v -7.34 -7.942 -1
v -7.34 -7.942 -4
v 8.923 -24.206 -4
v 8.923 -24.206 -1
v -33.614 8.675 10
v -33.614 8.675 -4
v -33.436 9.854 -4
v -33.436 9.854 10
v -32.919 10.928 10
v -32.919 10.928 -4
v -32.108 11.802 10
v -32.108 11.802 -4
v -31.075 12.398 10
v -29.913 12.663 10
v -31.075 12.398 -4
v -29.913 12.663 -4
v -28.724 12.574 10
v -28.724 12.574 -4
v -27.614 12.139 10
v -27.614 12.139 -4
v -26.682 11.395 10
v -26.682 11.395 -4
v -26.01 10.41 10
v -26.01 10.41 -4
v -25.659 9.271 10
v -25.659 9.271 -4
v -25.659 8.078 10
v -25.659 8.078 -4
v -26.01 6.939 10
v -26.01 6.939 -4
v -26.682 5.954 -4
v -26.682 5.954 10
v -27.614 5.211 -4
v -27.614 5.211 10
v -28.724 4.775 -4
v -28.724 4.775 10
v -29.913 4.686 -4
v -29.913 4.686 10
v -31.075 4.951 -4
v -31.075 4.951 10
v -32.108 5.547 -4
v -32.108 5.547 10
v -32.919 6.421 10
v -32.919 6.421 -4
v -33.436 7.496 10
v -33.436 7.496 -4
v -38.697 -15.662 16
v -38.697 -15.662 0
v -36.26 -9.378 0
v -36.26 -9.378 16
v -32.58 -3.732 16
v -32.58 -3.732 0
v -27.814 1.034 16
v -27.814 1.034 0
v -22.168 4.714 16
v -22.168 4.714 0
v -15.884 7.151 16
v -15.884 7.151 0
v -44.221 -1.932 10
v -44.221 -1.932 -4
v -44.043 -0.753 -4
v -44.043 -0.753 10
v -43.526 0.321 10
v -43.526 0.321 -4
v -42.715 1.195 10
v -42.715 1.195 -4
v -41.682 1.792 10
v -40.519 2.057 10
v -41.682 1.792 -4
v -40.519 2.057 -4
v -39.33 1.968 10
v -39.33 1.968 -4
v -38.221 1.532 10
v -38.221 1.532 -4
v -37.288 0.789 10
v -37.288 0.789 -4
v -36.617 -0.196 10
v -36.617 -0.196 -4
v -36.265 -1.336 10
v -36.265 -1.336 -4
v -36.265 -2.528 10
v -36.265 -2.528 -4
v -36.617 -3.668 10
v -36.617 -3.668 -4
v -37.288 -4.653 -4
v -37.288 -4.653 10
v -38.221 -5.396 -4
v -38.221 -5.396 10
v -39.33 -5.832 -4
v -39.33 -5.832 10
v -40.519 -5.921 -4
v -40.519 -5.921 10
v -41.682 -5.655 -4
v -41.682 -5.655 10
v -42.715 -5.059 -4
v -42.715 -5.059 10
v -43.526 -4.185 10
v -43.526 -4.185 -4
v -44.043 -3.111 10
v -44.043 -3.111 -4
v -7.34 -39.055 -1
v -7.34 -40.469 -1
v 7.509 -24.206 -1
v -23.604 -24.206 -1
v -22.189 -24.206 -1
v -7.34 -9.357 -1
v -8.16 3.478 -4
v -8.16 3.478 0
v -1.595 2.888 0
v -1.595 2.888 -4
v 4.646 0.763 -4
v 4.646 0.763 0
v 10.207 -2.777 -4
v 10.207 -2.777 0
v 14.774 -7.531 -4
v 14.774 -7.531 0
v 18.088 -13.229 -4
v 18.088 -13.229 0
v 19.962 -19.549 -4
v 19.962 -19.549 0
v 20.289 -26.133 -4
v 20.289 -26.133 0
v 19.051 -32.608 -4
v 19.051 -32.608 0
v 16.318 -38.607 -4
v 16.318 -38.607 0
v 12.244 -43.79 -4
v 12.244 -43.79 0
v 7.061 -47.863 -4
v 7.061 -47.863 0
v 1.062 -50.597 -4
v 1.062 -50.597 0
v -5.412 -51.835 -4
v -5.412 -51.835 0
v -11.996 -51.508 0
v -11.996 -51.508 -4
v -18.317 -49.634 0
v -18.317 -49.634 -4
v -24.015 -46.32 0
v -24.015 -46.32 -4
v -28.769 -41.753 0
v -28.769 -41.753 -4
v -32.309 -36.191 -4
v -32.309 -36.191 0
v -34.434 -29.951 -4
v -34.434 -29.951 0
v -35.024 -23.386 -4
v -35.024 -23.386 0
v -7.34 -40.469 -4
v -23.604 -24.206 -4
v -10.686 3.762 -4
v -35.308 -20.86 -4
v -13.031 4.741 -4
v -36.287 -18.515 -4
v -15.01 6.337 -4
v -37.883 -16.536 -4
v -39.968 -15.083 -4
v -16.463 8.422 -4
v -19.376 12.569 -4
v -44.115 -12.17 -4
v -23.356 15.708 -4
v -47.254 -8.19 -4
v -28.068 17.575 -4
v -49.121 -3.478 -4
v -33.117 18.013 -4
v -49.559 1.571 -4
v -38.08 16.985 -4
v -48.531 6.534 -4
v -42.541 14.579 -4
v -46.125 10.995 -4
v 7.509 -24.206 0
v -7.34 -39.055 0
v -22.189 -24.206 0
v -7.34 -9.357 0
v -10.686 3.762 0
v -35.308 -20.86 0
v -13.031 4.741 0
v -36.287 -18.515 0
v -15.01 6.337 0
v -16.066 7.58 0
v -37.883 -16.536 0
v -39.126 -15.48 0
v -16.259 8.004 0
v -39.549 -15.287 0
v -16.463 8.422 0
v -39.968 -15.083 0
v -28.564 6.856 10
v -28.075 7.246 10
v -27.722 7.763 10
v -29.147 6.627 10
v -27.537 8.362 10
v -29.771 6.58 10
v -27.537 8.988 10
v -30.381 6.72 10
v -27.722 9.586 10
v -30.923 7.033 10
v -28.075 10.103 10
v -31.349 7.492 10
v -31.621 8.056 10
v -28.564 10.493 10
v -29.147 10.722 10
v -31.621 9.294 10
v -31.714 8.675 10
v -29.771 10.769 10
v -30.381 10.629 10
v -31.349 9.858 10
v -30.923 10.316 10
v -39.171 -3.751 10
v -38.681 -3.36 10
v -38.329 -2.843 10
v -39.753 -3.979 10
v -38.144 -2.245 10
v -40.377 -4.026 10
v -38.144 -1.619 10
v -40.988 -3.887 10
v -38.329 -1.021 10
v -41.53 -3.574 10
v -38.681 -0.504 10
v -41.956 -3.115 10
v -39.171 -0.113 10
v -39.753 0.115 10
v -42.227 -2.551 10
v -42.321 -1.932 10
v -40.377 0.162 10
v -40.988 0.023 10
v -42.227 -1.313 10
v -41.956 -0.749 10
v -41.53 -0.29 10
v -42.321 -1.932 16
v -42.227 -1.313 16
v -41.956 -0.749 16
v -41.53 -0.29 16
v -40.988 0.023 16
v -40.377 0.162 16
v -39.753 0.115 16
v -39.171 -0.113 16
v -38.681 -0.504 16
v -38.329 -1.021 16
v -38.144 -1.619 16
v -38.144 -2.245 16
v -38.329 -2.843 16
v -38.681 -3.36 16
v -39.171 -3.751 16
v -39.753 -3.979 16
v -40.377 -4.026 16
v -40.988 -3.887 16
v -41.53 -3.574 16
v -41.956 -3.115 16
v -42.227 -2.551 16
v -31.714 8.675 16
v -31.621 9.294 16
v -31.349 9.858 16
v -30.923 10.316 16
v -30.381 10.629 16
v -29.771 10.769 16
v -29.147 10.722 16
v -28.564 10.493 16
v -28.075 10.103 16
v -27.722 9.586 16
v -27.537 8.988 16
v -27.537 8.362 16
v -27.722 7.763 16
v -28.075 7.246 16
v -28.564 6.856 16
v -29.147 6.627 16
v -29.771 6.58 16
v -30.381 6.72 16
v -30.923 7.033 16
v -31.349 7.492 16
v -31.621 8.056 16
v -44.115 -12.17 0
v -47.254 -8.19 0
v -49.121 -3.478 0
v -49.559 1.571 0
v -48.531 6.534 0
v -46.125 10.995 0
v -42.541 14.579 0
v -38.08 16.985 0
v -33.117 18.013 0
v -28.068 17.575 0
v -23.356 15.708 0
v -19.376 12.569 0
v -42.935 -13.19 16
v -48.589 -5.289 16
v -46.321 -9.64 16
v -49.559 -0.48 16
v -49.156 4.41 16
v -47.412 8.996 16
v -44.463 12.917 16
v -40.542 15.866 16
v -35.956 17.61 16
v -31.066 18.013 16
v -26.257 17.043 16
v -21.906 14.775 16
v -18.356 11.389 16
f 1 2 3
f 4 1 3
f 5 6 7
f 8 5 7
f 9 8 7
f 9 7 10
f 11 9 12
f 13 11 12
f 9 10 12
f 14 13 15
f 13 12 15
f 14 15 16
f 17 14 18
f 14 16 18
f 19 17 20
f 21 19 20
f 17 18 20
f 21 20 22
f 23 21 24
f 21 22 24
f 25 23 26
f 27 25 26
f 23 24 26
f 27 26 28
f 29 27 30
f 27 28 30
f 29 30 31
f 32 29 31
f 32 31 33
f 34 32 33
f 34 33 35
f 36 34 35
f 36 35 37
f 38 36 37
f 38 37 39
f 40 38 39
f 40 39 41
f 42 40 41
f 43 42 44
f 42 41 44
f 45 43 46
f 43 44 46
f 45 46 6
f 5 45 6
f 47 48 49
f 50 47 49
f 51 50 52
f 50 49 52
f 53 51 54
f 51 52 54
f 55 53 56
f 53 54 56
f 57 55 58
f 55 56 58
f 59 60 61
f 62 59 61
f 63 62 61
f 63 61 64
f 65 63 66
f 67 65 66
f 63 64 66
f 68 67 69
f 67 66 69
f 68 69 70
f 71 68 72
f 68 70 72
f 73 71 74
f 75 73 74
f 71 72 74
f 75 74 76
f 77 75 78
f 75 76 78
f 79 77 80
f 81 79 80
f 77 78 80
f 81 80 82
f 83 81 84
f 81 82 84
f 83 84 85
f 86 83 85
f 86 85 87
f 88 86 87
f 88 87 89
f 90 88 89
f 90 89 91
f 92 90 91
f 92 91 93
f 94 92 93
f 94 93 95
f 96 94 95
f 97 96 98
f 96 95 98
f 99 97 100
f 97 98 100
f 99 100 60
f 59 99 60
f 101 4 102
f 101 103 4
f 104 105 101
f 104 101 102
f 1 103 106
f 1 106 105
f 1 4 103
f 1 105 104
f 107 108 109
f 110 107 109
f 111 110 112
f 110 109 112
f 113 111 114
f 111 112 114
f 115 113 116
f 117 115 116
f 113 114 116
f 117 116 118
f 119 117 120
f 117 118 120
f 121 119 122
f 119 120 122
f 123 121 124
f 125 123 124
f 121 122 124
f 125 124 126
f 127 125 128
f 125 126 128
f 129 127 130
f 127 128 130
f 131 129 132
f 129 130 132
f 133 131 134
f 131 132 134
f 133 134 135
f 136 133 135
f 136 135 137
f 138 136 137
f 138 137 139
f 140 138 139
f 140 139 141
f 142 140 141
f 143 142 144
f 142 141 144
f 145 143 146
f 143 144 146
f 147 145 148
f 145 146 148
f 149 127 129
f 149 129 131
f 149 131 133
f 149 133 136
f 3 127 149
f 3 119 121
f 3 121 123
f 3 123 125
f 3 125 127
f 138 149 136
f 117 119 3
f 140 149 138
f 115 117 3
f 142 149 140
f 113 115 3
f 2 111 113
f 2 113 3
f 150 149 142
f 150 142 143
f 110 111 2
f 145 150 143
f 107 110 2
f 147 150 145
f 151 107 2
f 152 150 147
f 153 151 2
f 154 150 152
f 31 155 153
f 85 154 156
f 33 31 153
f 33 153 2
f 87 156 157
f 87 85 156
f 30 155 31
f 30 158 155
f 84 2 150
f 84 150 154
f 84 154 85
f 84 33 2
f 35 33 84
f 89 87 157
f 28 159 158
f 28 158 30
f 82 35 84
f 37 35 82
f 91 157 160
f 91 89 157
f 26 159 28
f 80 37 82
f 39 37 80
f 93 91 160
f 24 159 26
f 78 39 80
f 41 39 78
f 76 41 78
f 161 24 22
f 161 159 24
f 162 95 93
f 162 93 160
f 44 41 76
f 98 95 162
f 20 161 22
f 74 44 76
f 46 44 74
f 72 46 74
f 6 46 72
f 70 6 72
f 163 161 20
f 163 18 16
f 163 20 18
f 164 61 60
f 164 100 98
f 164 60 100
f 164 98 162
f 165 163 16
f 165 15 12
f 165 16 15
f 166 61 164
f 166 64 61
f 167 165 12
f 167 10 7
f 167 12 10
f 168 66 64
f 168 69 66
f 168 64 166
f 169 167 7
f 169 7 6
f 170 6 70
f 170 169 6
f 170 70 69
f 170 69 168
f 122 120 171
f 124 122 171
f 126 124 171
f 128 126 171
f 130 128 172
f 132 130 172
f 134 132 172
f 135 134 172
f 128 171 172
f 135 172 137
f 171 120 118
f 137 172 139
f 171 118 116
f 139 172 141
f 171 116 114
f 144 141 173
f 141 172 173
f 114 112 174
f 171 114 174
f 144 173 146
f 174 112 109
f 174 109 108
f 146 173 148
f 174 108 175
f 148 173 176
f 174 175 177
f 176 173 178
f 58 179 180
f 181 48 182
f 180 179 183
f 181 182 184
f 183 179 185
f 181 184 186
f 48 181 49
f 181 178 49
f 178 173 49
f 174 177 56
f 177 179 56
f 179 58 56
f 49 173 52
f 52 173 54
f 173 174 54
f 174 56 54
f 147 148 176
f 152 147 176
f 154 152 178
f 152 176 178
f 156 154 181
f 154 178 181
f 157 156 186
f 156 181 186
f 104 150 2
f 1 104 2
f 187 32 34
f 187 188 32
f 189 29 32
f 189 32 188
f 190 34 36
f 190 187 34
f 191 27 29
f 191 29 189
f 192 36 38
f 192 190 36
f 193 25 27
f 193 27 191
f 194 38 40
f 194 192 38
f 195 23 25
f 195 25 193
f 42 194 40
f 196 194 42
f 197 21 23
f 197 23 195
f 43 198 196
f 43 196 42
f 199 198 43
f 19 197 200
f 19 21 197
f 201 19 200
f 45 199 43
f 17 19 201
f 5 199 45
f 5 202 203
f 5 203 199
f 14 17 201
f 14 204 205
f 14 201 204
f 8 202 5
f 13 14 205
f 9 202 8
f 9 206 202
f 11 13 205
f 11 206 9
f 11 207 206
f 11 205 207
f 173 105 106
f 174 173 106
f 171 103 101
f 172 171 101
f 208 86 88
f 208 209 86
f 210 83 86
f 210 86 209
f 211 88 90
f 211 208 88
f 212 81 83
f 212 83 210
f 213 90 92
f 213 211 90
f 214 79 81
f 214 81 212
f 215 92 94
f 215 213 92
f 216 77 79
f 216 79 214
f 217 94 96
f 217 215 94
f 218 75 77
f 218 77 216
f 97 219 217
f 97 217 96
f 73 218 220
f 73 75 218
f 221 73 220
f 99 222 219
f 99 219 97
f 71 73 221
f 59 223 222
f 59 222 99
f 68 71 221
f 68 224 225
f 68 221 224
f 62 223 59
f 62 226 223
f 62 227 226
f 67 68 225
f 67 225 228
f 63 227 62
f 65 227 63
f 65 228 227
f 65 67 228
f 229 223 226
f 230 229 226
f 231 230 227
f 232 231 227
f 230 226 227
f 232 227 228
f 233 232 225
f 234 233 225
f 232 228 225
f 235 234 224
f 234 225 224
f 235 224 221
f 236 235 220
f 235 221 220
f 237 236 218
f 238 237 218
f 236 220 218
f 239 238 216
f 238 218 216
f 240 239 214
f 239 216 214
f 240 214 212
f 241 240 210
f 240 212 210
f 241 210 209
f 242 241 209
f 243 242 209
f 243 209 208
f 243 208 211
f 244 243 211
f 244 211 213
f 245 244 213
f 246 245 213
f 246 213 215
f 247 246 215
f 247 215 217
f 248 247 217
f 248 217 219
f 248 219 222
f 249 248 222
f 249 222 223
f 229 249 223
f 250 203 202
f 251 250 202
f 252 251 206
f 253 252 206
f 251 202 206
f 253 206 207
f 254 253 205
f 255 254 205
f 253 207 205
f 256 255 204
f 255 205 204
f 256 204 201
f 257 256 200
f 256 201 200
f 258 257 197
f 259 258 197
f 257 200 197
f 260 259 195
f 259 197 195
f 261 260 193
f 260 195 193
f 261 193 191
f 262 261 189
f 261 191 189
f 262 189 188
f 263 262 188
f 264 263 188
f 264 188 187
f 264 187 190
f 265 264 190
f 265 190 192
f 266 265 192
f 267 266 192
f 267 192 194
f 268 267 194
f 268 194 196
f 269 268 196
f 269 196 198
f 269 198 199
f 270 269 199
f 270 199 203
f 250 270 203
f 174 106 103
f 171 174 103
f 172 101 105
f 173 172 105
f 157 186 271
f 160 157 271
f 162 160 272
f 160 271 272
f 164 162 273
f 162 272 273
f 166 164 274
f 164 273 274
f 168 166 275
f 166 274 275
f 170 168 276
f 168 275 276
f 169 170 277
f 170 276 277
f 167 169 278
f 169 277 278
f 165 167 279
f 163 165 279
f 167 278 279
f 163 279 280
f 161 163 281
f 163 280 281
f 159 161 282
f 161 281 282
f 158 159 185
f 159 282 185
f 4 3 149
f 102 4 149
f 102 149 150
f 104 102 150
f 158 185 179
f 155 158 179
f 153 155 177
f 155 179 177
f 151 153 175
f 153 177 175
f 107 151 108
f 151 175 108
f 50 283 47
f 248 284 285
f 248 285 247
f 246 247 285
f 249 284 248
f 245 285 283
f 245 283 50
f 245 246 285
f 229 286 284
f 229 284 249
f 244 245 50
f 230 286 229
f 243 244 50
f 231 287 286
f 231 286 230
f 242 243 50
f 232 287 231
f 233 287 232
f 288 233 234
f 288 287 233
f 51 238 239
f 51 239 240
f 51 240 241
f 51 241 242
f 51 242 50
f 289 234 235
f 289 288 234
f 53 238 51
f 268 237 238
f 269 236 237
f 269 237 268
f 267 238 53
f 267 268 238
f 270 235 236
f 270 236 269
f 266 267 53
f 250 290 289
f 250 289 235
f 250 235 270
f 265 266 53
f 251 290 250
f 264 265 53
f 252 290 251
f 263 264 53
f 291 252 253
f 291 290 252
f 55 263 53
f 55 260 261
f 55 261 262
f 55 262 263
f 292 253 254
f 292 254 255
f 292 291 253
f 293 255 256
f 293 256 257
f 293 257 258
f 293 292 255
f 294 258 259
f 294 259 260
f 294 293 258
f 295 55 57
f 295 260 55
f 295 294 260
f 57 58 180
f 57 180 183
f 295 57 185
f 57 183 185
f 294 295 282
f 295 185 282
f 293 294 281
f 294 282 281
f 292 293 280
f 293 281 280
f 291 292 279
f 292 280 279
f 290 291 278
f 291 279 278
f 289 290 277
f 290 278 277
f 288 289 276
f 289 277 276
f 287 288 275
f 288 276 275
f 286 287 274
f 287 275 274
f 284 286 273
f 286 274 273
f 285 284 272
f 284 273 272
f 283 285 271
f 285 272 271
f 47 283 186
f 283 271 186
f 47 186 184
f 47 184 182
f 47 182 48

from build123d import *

# Parameters (mm, degrees)
BOSS_EXTRUDE1_DEPTH = 16
BOSS_EXTRUDE2_DEPTH = 4
SKETCH3_R           = 2.1
CUT_EXTRUDE1_DEPTH  = 21
SKETCH4_R           = 4
CUT_EXTRUDE2_DEPTH  = 14
CUT_EXTRUDE3_DEPTH  = 3
CUT_EXTRUDE4_DEPTH  = 18


with BuildPart() as part:
    # Sketch1 → Boss-Extrude1 (new body)
    with BuildSketch(Plane.XY):
        with BuildLine():
            ThreePointArc((-15.884378154, 7.150884492), (-44.46319957, 12.91724959), (-38.696834472, -15.661571826))
            ThreePointArc((-38.696834472, -15.661571826), (-30.321063947, -1.224886034), (-15.884378154, 7.150884492))
        make_face()
    extrude(amount=BOSS_EXTRUDE1_DEPTH)

    # Sketch2 → Boss-Extrude2 (add)
    with BuildSketch(Plane(origin=(0, 0, 0), x_dir=(-1, 0, 0), z_dir=(0, 0, -1))):
        with BuildLine():
            ThreePointArc((8.160247818, 3.478149899), (-12.244043633, -43.789993613), (35.024099879, -23.385702162))
            ThreePointArc((35.024099879, -23.385702162), (36.287266145, -18.514575936), (39.968005835, -15.08301433))
            ThreePointArc((39.968005835, -15.08301433), (44.46319957, 12.91724959), (16.46293565, 8.422055855))
            ThreePointArc((16.46293565, 8.422055855), (13.031374044, 4.741316164), (8.160247818, 3.478149899))
        make_face()
    extrude(amount=BOSS_EXTRUDE2_DEPTH)

    # Sketch3 → Cut-Extrude1 (cut, through all)
    with BuildSketch(Plane(origin=(0, 0, -4), x_dir=(-1, 0, 0), z_dir=(0, 0, -1))):
        with Locations((40.220558883, -1.931992815)):
            Circle(SKETCH3_R)
        with Locations((29.613957165, 8.674608903)):
            Circle(SKETCH3_R)
    extrude(amount=-CUT_EXTRUDE1_DEPTH, mode=Mode.SUBTRACT)

    # Sketch4 → Cut-Extrude2 (cut)
    with BuildSketch(Plane(origin=(0, 0, -4), x_dir=(-1, 0, 0), z_dir=(0, 0, -1))):
        with Locations((40.220558883, -1.931992815)):
            Circle(SKETCH4_R)
        with Locations((29.613957165, 8.674608903)):
            Circle(SKETCH4_R)
    extrude(amount=-CUT_EXTRUDE2_DEPTH, mode=Mode.SUBTRACT)

    # Sketch5 → Cut-Extrude3 (cut)
    with BuildSketch(Plane(origin=(0, 0, -4), x_dir=(-1, 0, 0), z_dir=(0, 0, -1))):
        Polygon((23.603549525, -24.205856422), (7.340093558, -7.942400455), (-8.923362409, -24.205856422), (7.340093558, -40.46931239), align=None)
    extrude(amount=-CUT_EXTRUDE3_DEPTH, mode=Mode.SUBTRACT)

    # Sketch6 → Cut-Extrude4 (cut, through all)
    with BuildSketch(Plane(origin=(0, 0, -1), x_dir=(-1, 0, 0), z_dir=(0, 0, -1))):
        Polygon((7.340093558, -39.055098827), (22.189335963, -24.205856422), (7.340093558, -9.356614017), (-7.509148847, -24.205856422), align=None)
    extrude(amount=-CUT_EXTRUDE4_DEPTH, mode=Mode.SUBTRACT)


solid = part.part
